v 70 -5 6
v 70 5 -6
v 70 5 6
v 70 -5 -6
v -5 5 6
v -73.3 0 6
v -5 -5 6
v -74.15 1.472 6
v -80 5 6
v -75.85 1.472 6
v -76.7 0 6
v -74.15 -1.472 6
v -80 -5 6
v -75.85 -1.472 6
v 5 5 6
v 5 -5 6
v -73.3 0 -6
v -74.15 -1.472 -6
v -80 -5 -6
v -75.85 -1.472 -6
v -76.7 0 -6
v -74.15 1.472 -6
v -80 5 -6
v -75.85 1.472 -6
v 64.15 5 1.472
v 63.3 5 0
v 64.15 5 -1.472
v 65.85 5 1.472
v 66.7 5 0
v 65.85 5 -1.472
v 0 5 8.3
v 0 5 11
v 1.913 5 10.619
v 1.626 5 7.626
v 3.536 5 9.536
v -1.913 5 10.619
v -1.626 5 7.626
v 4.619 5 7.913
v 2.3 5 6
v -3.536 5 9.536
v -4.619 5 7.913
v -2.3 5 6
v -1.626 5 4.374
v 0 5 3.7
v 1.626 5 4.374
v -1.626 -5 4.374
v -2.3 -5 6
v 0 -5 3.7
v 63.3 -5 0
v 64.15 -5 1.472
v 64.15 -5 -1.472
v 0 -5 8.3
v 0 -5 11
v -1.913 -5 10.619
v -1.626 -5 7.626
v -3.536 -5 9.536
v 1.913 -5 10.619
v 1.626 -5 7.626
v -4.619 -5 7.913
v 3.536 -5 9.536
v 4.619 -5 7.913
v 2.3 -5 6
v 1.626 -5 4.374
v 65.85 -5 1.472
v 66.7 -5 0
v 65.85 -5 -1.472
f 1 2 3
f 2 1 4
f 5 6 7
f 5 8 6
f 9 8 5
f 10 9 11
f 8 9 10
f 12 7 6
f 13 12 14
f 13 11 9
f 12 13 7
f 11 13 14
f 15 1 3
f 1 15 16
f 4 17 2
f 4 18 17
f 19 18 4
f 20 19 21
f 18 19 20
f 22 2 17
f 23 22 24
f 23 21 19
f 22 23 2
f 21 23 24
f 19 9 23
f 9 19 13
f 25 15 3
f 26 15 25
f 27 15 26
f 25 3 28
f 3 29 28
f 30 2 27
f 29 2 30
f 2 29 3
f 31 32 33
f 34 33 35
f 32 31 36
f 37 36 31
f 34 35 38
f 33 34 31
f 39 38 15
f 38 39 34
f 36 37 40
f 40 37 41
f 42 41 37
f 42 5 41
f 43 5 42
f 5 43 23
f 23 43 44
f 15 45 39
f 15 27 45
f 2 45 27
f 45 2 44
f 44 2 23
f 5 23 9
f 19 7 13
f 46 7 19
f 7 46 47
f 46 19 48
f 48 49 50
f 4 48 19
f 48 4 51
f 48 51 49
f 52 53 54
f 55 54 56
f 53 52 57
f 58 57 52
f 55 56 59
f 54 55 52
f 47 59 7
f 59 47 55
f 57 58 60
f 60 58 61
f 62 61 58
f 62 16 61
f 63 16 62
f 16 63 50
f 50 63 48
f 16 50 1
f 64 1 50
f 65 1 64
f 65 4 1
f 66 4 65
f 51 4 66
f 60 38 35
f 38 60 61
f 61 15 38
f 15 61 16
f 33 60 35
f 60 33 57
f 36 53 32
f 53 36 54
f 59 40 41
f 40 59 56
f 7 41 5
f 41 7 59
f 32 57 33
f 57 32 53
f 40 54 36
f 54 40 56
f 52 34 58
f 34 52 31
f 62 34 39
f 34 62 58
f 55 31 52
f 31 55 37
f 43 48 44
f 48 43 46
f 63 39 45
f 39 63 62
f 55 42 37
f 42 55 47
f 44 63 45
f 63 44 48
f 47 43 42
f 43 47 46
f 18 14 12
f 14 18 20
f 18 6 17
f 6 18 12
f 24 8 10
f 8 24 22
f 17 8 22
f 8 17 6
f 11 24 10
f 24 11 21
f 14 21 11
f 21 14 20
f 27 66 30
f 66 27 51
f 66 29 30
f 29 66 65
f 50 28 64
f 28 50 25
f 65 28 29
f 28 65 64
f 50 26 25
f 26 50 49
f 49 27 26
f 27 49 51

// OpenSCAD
module beam(){
    r1 = 75;                // Distancia del cabezal al apoyo
    r3 = 65;                // Distancia del ecualizador al apoyo
    e = 10;                 // Extension adicional total
    a = [r1+r3+e,10,12];    // Dimensiones del balancin
    rh = 1.7;               // Radio orificios para ajuste
    b = [5, 2.3];           // Dims ajuste (radio exterior e interior
    d = -5;                 // Desplazamiento lateral respecto del punto de apoyo
    
    difference(){
        union(){
            // Barra
            translate([d,0,0])
                cube(a, center = true);                       
            
            // Punto de apoyo
            translate([0,0,a.z/2])
            rotate([90,0,0])
                cylinder(r = b.x, h = a.y, center = true);
        }
        
        // Agujero para el eje del punto de apoyo
        translate([0,0,a.z/2])
        rotate([90,0,0])
            cylinder(r = b.y, h = a.y+1, center = true);
        
        // Tornillo ajuste ecualizador
        translate([-r1,0,0])
            cylinder(r = rh, h = a.z+1, center = true);
        
        // Tornillo ajuste del cabezal
        translate([r3,0,0])
        rotate([90,0,0])
            cylinder(r = rh, h = a.y+1, center = true);
    }
}

beam();
